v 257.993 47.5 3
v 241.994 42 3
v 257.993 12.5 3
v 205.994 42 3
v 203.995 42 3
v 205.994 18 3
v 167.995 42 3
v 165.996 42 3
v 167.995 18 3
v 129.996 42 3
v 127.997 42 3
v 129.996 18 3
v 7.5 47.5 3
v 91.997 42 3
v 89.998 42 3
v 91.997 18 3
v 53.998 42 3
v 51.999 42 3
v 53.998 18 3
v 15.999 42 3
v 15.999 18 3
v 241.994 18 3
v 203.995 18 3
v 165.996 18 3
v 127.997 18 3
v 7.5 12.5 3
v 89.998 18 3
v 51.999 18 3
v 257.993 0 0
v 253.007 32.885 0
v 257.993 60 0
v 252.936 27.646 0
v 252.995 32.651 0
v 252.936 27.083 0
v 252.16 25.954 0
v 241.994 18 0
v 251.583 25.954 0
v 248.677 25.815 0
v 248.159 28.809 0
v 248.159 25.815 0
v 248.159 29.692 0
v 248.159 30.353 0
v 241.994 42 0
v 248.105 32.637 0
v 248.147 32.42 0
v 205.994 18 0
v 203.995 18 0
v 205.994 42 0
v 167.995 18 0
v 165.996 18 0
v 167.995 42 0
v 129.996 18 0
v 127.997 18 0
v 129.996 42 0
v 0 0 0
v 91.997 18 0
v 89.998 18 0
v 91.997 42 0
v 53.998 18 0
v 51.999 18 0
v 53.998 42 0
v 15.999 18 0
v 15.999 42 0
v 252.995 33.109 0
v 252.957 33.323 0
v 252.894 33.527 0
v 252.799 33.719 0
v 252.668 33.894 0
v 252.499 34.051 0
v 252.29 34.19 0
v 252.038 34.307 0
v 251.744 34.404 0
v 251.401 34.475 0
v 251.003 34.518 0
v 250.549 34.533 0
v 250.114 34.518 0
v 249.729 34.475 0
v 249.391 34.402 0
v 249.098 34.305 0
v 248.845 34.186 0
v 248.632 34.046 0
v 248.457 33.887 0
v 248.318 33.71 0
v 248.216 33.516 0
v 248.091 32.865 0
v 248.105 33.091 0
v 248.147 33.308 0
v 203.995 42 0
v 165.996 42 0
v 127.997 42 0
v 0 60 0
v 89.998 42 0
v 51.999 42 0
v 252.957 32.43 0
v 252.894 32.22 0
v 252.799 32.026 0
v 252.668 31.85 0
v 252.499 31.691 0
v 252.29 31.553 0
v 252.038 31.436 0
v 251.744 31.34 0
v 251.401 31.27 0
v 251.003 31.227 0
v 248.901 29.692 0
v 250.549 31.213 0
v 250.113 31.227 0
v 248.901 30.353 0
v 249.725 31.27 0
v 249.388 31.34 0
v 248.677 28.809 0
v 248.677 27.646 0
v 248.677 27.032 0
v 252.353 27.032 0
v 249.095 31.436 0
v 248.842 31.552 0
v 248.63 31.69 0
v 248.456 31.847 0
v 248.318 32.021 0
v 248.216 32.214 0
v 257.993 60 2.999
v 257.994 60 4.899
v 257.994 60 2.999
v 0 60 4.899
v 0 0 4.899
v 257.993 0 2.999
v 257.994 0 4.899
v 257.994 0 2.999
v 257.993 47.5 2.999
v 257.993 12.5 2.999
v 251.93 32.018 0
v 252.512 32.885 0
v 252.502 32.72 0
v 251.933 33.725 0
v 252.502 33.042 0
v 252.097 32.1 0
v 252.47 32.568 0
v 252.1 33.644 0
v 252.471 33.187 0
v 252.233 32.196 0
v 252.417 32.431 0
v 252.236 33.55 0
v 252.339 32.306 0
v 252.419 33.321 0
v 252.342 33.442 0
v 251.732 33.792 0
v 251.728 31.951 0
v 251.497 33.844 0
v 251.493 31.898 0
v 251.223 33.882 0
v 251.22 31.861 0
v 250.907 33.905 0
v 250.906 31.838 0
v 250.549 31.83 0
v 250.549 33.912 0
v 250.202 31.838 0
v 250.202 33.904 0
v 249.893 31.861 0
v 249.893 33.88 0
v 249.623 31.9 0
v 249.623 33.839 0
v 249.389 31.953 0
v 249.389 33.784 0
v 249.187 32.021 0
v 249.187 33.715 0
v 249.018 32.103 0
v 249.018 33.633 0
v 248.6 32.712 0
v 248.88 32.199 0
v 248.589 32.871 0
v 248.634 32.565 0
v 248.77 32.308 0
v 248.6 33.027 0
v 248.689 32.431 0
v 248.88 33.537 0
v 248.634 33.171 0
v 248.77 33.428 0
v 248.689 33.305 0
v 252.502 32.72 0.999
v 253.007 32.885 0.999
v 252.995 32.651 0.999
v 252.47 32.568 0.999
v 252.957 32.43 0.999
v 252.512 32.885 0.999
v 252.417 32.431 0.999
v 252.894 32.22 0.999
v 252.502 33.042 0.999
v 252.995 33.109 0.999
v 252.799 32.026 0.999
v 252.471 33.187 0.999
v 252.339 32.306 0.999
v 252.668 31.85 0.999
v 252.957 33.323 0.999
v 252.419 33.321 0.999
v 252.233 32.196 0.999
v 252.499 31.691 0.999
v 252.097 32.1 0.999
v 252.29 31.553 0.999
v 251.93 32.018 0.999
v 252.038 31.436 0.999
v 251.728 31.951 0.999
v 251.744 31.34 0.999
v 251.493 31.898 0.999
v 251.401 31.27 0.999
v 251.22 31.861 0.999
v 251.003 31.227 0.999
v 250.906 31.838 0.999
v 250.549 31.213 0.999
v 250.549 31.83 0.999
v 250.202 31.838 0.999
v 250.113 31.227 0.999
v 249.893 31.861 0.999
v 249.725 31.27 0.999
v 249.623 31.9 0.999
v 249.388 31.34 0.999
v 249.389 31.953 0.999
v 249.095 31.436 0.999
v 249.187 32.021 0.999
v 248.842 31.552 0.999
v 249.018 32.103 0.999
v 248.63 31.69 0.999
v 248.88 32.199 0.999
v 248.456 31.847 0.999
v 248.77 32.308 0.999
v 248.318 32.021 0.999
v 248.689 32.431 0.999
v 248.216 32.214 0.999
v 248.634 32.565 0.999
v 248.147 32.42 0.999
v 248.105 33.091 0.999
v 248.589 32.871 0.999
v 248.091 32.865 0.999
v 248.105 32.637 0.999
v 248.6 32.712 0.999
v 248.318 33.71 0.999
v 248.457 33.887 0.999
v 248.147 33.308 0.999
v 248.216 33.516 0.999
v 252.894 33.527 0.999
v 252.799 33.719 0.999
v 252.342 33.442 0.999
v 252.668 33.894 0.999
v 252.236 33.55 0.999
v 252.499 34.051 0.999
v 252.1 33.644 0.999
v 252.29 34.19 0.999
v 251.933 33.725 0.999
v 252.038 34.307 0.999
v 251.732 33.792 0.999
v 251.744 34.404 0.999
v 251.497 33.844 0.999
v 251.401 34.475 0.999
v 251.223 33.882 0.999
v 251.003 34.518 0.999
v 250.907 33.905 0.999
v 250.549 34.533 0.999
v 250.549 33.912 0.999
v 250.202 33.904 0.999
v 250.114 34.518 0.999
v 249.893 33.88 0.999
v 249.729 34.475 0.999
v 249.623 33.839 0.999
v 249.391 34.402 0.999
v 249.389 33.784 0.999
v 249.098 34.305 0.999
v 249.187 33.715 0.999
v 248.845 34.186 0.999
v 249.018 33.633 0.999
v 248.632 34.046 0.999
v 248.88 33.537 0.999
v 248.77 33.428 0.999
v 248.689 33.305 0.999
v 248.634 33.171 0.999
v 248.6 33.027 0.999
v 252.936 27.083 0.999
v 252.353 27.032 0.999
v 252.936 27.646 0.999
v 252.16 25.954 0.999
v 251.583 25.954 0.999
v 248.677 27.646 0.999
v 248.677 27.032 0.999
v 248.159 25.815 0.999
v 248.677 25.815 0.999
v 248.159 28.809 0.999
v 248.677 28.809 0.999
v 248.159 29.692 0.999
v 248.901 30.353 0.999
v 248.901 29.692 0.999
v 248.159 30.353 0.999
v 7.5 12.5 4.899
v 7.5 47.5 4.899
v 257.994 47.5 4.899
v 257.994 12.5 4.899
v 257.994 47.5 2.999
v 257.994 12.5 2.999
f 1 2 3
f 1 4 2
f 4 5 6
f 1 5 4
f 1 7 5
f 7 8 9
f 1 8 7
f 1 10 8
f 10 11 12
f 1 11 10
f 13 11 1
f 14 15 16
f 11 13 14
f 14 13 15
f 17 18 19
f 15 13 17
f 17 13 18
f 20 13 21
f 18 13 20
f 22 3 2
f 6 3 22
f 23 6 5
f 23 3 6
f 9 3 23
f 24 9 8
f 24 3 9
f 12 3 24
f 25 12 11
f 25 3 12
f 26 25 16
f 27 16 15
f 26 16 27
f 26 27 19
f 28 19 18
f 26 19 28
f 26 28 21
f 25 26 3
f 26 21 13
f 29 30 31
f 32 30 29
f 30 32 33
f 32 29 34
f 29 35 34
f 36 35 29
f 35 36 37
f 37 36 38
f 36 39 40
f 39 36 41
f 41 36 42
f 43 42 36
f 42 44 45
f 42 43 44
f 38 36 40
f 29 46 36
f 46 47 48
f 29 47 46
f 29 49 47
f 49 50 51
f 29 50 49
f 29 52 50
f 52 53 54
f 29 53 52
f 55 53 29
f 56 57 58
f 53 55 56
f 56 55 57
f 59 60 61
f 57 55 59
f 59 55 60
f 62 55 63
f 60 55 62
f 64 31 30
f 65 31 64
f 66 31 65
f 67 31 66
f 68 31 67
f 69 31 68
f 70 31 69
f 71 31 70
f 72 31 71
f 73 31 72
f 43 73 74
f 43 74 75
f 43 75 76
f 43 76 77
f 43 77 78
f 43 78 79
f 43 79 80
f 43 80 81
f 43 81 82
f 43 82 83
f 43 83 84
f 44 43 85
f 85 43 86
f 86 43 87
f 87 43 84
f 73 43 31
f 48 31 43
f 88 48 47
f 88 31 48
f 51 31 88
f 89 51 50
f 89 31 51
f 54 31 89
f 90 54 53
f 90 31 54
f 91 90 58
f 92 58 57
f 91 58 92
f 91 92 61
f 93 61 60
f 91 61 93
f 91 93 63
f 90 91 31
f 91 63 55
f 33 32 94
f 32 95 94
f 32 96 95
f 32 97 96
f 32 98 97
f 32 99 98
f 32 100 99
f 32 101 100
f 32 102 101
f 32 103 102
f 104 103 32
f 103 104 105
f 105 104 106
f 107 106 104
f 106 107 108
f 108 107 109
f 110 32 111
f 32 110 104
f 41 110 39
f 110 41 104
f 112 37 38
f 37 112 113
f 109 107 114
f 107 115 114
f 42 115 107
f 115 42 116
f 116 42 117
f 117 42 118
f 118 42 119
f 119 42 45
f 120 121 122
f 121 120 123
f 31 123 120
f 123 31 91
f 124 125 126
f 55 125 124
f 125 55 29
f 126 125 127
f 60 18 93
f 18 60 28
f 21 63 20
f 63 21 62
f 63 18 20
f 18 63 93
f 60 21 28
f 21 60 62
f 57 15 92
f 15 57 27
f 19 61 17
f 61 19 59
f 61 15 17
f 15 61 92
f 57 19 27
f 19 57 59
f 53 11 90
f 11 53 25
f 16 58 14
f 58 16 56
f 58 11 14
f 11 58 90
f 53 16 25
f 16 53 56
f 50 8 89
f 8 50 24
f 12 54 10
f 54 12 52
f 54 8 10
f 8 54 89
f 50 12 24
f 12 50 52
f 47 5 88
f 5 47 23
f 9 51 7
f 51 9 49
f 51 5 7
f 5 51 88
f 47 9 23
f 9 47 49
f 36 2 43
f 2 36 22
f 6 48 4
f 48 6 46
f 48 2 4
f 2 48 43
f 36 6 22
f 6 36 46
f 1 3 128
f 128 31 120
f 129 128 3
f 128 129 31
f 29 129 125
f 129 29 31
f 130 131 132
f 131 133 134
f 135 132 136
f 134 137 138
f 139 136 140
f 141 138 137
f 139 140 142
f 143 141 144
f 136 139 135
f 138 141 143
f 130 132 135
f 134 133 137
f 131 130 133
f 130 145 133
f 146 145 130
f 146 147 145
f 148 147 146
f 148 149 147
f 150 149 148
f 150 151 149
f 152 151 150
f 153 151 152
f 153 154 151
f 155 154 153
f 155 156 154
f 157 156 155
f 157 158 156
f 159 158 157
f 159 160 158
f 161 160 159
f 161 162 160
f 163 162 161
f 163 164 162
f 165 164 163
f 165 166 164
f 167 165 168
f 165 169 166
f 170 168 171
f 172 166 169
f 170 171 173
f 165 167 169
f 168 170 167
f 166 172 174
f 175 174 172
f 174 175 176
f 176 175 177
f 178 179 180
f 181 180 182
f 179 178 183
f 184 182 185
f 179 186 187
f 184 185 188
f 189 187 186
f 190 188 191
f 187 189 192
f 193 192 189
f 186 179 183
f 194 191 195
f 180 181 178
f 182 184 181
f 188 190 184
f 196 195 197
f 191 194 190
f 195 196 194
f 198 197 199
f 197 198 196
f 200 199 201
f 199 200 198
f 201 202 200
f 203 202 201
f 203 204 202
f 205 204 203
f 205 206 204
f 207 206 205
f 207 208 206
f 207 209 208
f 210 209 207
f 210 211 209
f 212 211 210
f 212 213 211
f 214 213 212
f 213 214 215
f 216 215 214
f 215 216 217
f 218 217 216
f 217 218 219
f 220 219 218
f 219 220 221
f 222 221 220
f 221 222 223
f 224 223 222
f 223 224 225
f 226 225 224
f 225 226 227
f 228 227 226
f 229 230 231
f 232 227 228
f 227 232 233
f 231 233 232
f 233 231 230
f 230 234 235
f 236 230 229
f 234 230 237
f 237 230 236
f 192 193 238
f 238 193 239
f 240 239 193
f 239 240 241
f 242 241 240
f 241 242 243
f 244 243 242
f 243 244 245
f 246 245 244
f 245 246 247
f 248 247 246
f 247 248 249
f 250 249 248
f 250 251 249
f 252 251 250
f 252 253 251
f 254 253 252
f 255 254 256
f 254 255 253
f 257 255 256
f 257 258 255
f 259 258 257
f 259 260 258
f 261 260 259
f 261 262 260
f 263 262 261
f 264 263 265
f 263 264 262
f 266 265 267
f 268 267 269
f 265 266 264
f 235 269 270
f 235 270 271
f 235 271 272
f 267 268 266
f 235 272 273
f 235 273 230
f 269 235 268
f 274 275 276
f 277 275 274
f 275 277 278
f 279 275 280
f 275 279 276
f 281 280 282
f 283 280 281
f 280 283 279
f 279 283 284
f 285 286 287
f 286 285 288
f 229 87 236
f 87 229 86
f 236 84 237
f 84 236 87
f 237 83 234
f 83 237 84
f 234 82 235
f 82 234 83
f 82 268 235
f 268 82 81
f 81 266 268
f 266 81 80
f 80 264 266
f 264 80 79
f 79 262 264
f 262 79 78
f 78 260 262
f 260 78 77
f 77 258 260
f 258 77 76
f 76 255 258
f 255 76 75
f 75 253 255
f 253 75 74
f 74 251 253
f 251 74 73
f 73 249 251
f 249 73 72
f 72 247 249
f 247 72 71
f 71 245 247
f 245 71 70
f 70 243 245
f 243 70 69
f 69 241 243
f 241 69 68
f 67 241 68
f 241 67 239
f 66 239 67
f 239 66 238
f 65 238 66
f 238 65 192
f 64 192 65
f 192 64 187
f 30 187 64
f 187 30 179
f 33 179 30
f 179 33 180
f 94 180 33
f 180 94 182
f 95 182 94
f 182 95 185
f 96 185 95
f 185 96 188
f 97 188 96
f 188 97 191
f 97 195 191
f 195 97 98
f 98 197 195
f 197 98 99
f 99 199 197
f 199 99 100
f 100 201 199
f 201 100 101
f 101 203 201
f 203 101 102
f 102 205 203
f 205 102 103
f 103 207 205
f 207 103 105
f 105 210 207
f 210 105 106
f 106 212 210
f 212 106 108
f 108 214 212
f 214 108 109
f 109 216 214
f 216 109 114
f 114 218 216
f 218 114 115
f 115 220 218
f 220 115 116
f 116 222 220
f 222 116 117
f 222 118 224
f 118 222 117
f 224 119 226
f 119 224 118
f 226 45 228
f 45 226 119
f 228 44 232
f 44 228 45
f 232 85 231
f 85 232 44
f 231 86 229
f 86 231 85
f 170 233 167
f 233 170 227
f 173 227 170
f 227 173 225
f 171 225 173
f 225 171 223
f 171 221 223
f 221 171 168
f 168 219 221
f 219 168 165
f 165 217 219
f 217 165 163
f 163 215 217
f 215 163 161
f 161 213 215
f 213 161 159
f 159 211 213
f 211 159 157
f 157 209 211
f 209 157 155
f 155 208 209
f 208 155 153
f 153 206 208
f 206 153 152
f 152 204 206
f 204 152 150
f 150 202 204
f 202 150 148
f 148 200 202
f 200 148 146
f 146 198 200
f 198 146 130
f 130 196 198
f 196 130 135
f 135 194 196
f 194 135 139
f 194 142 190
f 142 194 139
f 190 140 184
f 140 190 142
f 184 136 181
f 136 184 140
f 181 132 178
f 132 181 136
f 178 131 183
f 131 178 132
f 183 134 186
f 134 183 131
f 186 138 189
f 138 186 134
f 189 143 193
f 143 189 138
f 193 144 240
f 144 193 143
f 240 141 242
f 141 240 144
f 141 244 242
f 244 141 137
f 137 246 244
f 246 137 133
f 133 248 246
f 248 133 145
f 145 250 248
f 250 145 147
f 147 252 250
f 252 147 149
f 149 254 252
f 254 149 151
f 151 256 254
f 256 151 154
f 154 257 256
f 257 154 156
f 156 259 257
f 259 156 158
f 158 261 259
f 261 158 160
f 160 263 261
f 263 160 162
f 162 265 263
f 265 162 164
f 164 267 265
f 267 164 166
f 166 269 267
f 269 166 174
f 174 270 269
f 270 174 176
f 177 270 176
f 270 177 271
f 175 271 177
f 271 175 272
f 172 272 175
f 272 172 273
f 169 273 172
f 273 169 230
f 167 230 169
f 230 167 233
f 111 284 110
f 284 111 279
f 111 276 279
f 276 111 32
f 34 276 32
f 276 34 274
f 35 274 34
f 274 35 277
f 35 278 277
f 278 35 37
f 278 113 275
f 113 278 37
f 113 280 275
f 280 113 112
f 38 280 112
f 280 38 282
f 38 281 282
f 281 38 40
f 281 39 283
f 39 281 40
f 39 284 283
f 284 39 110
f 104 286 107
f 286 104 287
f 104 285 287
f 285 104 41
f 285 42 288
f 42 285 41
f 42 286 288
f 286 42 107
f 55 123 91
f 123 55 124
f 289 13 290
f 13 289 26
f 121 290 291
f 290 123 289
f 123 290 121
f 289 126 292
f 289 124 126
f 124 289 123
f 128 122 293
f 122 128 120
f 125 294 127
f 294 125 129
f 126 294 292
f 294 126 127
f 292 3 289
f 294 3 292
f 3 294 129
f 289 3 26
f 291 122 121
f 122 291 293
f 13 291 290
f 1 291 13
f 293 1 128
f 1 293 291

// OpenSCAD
//film holder for 35mm film used with anti-Newton glass

ver="1.0";

//film height
film_height = 35; //35mm film - (34.976 ± 0.025 mm - so max is 35.001) 

//width of frame
fw=36;

//height of frame
fh=24;

//width of post between frames
p=2;//nikon f100 creates spacing of 2mm

//width of margin near top and bottom of the frame
mh=18;

//height of holder base
h1=3;

//height of 'lips' that hold anti-Newton glass
h2=1.9; //my glass has height 2mm, I want holder to rest on glass, not on plastic, because glass is smoother

//gap between copies so openscad understands they form one piece
g=0.001;

//number of frames
n = 6;

//width of left and right borders
mw = 15;

//anti-Newton glass height
//angh = 32.8; //real is 33 (ordered 34!)
angh = film_height; //otherwise film won't fit!
//we need glass 270x35

assert(angh >= film_height, "Film won't fit into glass channel");


total_base_height = fh+2*mh;
full_frame_width=fw+p-g;
full_base_width=full_frame_width*n+2*mw;

echo(str("width=", full_base_width));

module frame() {
    difference() {
        cube([fw+p,total_base_height, h1], center=true);
        cube([fw, fh, h1+g*2], center=true);
    }
}

module base_main() {
    for (i=[0:1:n-1]) {
        translate([full_frame_width*i,0,0]) 
            frame();
    }
}

module base_side() {
    cube([mw,total_base_height,h1], center=true);
}

module base() {
    //main base
    translate([mw+0.5*(fw+p)-g,0,0]) base_main();
    //left margin
    translate([mw/2,0,0]) base_side();
    //right margin
    translate([1.5*mw+full_frame_width*n-g,0,0]) difference() {
        base_side();
        //version label
        translate([0,0,-h1/2-g]) 
            mirror([1,0,0])
            rotate([0,0,90])
            linear_extrude(h1/3) text(ver, valign="center", halign="center", size=5);
    }
}

module lip(lip_height) {
    cube([full_base_width, lip_height,h2]);
}

module lips() {
    //stopper so that glass doesn't move
    cube([mw/2,total_base_height,h2]);
    //lips
    lip_height = (total_base_height-angh)/2;
    lip(lip_height);
    translate([0,angh+lip_height,0]) lip(lip_height);
}

translate([0,total_base_height/2,h1/2]) base();
translate([0,0,h1-g]) lips();
